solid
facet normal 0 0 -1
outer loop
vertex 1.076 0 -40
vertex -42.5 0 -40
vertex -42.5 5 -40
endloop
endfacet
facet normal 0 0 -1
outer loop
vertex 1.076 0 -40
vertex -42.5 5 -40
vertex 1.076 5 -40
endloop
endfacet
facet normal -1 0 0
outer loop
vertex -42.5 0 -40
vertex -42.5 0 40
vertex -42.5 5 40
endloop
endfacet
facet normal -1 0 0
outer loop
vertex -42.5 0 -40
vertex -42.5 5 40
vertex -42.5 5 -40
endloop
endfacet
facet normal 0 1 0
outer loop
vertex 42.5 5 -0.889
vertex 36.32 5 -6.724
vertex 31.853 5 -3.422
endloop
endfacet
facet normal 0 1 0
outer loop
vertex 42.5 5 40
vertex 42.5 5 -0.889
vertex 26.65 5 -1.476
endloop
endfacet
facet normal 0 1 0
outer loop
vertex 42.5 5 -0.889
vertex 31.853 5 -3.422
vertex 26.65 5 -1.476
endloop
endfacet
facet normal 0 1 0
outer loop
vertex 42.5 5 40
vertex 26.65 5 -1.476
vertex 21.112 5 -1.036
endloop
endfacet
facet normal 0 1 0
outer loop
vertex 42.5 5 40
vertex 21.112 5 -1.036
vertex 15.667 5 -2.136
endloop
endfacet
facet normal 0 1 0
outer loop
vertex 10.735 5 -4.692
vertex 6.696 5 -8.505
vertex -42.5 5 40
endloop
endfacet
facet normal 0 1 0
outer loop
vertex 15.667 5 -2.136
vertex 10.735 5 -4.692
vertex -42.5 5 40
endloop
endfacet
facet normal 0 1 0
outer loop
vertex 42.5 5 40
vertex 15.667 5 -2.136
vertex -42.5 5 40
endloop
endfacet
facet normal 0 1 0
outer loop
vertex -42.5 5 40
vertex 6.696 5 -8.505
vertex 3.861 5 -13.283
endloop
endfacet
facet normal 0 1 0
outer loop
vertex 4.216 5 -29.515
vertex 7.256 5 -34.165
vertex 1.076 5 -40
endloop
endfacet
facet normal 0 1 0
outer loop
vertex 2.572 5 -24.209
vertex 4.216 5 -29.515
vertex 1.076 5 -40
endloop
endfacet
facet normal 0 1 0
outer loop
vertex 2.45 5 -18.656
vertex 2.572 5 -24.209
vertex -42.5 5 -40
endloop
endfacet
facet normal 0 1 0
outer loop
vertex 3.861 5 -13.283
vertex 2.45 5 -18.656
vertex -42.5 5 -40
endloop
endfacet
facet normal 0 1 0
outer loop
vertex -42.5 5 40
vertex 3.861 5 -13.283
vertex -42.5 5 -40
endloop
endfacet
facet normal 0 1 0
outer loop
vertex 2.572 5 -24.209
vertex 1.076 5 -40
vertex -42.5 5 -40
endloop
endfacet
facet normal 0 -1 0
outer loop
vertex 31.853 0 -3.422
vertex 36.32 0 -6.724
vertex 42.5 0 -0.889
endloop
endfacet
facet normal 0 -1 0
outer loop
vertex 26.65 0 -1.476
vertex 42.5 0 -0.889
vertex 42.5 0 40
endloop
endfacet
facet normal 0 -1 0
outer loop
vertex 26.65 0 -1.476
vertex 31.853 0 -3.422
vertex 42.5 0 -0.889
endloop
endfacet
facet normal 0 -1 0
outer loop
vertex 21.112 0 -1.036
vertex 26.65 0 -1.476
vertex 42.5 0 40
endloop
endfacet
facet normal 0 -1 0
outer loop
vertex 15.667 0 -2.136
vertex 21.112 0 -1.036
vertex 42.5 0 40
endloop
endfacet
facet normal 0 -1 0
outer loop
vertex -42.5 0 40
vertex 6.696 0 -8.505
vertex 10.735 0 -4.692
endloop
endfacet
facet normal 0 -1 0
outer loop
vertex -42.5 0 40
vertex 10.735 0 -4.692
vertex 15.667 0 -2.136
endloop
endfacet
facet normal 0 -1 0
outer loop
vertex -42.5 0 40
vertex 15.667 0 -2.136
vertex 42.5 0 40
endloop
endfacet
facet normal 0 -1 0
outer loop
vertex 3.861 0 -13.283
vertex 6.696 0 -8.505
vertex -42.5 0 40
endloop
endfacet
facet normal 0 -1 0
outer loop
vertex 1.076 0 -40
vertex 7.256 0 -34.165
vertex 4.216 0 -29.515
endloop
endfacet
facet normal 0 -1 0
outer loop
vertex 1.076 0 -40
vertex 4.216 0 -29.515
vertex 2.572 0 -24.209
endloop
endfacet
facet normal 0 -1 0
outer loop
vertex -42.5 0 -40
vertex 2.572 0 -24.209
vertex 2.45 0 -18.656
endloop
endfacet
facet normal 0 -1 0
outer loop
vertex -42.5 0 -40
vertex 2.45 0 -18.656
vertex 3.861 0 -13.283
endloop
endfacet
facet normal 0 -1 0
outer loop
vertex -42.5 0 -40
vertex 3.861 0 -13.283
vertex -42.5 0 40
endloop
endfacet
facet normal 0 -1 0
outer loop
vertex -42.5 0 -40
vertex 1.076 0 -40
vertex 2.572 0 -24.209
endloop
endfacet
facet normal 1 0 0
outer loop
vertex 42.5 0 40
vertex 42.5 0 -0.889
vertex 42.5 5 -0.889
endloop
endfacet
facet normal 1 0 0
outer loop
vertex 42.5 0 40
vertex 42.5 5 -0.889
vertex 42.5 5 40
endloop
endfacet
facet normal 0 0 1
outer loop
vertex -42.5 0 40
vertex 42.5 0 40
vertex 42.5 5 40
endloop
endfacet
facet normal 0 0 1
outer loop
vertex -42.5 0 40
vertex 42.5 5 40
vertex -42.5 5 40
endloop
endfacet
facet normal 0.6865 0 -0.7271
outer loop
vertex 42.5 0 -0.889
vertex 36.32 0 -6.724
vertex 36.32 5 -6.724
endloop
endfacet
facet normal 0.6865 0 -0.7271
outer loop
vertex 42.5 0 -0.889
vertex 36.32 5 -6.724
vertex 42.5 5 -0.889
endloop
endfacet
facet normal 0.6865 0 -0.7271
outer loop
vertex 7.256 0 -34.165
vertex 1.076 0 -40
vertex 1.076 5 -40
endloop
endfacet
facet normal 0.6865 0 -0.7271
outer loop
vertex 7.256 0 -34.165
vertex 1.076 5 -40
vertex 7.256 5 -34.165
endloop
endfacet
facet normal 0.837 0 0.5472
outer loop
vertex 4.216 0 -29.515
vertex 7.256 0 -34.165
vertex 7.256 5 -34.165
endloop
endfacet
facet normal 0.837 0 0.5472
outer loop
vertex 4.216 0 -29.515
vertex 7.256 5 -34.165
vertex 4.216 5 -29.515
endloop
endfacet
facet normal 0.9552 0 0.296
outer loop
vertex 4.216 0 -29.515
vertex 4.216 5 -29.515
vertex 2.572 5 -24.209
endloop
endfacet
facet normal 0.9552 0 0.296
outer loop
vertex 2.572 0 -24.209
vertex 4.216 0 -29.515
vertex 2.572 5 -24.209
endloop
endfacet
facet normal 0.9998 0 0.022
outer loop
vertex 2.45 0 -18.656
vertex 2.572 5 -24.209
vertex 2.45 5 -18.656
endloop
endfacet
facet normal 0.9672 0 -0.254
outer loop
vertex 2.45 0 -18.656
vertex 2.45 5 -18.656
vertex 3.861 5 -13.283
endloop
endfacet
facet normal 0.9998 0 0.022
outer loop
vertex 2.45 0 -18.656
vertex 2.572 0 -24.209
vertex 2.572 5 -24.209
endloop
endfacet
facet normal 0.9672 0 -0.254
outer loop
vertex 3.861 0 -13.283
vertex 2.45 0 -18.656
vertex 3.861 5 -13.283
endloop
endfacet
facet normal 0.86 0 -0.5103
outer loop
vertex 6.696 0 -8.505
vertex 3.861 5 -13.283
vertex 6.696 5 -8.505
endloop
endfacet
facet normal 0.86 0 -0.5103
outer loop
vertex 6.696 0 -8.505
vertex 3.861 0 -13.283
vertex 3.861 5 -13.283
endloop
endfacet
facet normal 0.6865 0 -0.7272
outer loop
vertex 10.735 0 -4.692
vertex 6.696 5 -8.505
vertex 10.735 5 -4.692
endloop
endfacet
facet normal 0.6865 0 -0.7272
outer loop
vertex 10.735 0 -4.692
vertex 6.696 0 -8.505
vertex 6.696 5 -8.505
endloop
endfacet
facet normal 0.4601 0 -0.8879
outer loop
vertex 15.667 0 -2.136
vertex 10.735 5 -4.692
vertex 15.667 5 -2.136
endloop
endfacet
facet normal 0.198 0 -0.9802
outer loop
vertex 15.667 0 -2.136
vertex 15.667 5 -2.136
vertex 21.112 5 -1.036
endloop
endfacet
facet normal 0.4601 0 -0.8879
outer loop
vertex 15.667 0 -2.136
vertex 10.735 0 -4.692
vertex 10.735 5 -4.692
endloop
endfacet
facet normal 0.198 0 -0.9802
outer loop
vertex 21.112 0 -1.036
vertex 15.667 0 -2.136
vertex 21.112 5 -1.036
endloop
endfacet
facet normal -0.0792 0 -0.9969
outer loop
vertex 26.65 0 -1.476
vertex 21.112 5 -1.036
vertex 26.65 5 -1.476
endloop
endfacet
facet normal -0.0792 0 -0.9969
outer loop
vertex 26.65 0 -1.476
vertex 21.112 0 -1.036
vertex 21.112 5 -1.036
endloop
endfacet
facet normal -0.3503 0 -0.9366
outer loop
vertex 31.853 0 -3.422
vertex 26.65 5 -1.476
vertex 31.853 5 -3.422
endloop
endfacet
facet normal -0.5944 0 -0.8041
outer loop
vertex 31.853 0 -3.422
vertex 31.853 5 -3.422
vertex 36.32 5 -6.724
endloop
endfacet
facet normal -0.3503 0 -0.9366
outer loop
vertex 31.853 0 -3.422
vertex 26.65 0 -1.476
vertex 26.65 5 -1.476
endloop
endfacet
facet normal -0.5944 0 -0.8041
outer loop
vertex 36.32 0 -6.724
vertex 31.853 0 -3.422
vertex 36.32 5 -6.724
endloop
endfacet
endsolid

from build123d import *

# Parameters (mm, degrees)
BOSS_EXTRU_1_DEPTH = 5


with BuildPart() as part:
    # Esquisse1 → Boss.-Extru.1 (new body)
    with BuildSketch(Plane(origin=(0, 0, 0), x_dir=(1, 0, 0), z_dir=(0, 1, 0))):
        with BuildLine():
            Line((-42.5, 40), (1.075699519, 40))
            Line((1.075699519, 40), (7.256174968, 34.16461456))
            ThreePointArc((7.256174968, 34.16461456), (8.582181318, 6.457704827), (36.319524552, 6.724031969))
            Line((36.319524552, 6.724031969), (42.5, 0.88864653))
            Line((42.5, 0.88864653), (42.5, -40))
            Line((42.5, -40), (-42.5, -40))
            Line((-42.5, -40), (-42.5, 40))
        make_face()
    extrude(amount=BOSS_EXTRU_1_DEPTH)


solid = part.part
